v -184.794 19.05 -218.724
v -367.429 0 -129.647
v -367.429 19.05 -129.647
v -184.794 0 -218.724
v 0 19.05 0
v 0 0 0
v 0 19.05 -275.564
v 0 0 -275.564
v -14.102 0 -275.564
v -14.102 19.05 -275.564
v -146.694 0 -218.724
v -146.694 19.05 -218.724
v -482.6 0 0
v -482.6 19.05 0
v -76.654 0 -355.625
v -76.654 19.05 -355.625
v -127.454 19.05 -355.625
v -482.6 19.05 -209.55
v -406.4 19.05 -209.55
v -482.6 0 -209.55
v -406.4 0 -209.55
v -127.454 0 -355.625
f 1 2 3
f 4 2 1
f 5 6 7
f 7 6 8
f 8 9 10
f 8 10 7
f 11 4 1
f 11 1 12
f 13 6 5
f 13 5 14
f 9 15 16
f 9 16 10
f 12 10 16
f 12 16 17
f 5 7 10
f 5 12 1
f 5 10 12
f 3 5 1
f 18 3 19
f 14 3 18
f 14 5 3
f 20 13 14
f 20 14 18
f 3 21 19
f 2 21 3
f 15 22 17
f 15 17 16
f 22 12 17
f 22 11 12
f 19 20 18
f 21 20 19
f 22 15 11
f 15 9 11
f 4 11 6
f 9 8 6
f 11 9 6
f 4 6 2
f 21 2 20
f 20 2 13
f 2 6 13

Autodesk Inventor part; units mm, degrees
ref_plane "YZ Plane" through (0, 0, 0) normal (1, 0, 0) x (0, 1, 0)
ref_plane "XZ Plane" through (0, 0, 0) normal (0, 1, 0) x (-1, 0, 0)
ref_plane "XY Plane" through (0, 0, 0) normal (0, 0, 1) x (1, 0, 0)
sketch "Sketch1" plane through (0, 0, 0) normal (0, 1, 0) x (-1, 0, 0)
  line L0 (0, 0) -> (482.6, 0)
  line L1 (482.6, 0) -> (482.6, -209.55)
  line L2 (482.6, -209.55) -> (406.4, -209.55)
  line L3 (406.4, -209.55) -> (367.4288, -129.6472)
  line L4 (367.4288, -129.6472) -> (184.7939, -218.7242)
  line L5 (184.7939, -218.7242) -> (146.6939, -218.7242)
  line L6 (146.6939, -218.7242) -> (127.4536, -355.6254)
  line L7 (127.4536, -355.6254) -> (76.6536, -355.6254)
  line L8 (76.6536, -355.6254) -> (14.1024, -275.5635)
  line L9 (14.1024, -275.5635) -> (0, -275.5635)
  line L10 (0, 0) -> (0, -275.5635)
  point P0 (438.8308, 0)
  point P1 (482.6, -106.5112)
  dimension "d22" = 98
  dimension "d23" = 154
  dimension "d26" = 76.2
  dimension "d27" = 128
  dimension "d29" = 355.6254
  dimension "d30" = 88.9
  dimension "d33" = 203.2
  dimension "d34" = 38.1
  dimension "d35" = 50.8
  dimension "d36" = 101.6
  dimension "d37" = 138.2466
  dimension "d38" = 209.55
  dimension "d39" = 482.6
extrude "Extrusion1" add sketch "Sketch1" along normal blind 19.05
properties part number "Side Panel"
